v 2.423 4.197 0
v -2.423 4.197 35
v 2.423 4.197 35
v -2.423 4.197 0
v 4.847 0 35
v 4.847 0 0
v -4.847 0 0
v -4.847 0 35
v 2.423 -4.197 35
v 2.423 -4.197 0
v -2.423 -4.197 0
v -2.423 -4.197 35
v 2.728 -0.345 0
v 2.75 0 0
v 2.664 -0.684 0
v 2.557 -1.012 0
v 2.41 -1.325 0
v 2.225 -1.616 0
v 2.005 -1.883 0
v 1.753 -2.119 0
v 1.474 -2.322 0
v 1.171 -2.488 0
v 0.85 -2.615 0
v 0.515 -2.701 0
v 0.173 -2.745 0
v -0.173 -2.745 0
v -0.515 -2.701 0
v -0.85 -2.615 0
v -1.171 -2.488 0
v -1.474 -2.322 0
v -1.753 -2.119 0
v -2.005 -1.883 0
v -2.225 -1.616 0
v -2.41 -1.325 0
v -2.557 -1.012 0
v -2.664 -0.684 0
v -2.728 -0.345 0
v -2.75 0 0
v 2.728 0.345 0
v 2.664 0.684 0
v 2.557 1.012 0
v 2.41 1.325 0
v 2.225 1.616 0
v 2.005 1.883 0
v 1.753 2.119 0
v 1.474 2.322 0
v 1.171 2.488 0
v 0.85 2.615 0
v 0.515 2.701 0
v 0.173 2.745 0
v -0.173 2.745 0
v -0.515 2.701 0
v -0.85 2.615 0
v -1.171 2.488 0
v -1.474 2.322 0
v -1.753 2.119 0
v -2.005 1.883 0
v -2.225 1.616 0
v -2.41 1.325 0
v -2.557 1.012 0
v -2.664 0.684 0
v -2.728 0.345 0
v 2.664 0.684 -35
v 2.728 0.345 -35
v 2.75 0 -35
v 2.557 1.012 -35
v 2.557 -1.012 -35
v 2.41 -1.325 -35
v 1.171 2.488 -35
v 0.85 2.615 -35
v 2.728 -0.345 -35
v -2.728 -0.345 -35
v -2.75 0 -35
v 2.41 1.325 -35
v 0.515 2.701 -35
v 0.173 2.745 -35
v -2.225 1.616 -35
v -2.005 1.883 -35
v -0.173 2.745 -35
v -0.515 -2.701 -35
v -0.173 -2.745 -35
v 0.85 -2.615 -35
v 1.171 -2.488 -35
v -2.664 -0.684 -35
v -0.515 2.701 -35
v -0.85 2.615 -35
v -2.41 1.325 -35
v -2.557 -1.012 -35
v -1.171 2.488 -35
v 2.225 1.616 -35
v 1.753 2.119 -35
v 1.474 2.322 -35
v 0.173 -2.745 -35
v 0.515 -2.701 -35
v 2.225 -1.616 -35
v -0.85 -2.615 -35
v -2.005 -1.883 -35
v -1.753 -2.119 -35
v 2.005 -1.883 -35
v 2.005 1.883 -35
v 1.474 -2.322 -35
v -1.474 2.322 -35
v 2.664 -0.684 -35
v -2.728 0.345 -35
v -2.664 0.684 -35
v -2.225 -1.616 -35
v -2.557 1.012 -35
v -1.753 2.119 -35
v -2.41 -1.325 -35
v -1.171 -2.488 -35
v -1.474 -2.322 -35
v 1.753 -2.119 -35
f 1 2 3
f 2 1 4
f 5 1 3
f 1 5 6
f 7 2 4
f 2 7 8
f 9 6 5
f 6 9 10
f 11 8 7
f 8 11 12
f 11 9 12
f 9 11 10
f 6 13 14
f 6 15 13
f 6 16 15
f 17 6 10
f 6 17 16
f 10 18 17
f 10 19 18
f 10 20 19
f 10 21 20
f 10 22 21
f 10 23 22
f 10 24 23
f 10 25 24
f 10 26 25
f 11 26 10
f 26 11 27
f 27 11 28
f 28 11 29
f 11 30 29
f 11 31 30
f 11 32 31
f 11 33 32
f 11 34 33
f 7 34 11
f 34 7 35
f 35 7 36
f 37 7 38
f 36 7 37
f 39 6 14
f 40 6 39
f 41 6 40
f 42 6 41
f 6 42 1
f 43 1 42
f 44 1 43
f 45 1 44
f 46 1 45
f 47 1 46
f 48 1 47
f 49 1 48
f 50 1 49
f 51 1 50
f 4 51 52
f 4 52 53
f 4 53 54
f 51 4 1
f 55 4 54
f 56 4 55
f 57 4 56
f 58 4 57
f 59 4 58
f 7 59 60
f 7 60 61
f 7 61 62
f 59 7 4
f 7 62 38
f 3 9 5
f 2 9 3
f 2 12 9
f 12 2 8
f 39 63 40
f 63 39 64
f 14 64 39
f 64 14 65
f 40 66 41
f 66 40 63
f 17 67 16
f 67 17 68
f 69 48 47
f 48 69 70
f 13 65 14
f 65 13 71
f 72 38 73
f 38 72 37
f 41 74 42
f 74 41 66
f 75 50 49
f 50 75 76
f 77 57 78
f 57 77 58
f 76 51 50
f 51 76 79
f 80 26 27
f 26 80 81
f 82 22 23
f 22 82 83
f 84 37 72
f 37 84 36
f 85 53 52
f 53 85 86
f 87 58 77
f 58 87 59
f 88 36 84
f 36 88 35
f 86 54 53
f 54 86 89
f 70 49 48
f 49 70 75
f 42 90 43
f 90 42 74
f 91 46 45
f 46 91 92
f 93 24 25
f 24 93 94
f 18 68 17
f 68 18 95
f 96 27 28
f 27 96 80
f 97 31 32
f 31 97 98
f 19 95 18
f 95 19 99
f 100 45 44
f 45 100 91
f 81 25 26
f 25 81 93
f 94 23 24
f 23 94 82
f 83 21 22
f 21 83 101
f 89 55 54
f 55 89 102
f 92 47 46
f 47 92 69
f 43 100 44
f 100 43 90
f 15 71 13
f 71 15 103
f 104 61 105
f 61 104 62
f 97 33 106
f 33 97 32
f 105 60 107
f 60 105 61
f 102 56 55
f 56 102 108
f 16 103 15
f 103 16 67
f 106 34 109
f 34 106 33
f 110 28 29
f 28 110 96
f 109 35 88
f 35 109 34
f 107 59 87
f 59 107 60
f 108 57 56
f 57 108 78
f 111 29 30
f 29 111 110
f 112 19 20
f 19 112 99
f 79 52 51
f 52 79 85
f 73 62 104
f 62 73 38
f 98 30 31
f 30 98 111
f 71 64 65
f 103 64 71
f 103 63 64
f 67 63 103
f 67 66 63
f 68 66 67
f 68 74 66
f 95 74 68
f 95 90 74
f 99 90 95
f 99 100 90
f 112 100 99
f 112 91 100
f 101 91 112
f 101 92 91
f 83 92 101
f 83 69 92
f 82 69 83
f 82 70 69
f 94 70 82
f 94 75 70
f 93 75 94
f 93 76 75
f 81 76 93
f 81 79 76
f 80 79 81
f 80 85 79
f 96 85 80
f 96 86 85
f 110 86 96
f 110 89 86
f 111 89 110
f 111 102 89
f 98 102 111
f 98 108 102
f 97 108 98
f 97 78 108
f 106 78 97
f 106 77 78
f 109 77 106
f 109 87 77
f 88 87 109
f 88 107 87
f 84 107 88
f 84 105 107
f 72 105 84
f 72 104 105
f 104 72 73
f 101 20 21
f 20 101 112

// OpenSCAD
$fn = 50;


difference() {
	union() {
		linear_extrude(height = 35) {
			polygon(points = [[4.8468000000, 0.0000000000], [2.4234000000, 4.1974519271], [-2.4234000000, 4.1974519271], [-4.8468000000, 0.0000000000], [-2.4234000000, -4.1974519271], [2.4234000000, -4.1974519271]]);
		}
		translate(v = [0, 0, -35]) {
			cylinder(h = 35, r = 2.7500000000);
		}
	}
	union();
}
